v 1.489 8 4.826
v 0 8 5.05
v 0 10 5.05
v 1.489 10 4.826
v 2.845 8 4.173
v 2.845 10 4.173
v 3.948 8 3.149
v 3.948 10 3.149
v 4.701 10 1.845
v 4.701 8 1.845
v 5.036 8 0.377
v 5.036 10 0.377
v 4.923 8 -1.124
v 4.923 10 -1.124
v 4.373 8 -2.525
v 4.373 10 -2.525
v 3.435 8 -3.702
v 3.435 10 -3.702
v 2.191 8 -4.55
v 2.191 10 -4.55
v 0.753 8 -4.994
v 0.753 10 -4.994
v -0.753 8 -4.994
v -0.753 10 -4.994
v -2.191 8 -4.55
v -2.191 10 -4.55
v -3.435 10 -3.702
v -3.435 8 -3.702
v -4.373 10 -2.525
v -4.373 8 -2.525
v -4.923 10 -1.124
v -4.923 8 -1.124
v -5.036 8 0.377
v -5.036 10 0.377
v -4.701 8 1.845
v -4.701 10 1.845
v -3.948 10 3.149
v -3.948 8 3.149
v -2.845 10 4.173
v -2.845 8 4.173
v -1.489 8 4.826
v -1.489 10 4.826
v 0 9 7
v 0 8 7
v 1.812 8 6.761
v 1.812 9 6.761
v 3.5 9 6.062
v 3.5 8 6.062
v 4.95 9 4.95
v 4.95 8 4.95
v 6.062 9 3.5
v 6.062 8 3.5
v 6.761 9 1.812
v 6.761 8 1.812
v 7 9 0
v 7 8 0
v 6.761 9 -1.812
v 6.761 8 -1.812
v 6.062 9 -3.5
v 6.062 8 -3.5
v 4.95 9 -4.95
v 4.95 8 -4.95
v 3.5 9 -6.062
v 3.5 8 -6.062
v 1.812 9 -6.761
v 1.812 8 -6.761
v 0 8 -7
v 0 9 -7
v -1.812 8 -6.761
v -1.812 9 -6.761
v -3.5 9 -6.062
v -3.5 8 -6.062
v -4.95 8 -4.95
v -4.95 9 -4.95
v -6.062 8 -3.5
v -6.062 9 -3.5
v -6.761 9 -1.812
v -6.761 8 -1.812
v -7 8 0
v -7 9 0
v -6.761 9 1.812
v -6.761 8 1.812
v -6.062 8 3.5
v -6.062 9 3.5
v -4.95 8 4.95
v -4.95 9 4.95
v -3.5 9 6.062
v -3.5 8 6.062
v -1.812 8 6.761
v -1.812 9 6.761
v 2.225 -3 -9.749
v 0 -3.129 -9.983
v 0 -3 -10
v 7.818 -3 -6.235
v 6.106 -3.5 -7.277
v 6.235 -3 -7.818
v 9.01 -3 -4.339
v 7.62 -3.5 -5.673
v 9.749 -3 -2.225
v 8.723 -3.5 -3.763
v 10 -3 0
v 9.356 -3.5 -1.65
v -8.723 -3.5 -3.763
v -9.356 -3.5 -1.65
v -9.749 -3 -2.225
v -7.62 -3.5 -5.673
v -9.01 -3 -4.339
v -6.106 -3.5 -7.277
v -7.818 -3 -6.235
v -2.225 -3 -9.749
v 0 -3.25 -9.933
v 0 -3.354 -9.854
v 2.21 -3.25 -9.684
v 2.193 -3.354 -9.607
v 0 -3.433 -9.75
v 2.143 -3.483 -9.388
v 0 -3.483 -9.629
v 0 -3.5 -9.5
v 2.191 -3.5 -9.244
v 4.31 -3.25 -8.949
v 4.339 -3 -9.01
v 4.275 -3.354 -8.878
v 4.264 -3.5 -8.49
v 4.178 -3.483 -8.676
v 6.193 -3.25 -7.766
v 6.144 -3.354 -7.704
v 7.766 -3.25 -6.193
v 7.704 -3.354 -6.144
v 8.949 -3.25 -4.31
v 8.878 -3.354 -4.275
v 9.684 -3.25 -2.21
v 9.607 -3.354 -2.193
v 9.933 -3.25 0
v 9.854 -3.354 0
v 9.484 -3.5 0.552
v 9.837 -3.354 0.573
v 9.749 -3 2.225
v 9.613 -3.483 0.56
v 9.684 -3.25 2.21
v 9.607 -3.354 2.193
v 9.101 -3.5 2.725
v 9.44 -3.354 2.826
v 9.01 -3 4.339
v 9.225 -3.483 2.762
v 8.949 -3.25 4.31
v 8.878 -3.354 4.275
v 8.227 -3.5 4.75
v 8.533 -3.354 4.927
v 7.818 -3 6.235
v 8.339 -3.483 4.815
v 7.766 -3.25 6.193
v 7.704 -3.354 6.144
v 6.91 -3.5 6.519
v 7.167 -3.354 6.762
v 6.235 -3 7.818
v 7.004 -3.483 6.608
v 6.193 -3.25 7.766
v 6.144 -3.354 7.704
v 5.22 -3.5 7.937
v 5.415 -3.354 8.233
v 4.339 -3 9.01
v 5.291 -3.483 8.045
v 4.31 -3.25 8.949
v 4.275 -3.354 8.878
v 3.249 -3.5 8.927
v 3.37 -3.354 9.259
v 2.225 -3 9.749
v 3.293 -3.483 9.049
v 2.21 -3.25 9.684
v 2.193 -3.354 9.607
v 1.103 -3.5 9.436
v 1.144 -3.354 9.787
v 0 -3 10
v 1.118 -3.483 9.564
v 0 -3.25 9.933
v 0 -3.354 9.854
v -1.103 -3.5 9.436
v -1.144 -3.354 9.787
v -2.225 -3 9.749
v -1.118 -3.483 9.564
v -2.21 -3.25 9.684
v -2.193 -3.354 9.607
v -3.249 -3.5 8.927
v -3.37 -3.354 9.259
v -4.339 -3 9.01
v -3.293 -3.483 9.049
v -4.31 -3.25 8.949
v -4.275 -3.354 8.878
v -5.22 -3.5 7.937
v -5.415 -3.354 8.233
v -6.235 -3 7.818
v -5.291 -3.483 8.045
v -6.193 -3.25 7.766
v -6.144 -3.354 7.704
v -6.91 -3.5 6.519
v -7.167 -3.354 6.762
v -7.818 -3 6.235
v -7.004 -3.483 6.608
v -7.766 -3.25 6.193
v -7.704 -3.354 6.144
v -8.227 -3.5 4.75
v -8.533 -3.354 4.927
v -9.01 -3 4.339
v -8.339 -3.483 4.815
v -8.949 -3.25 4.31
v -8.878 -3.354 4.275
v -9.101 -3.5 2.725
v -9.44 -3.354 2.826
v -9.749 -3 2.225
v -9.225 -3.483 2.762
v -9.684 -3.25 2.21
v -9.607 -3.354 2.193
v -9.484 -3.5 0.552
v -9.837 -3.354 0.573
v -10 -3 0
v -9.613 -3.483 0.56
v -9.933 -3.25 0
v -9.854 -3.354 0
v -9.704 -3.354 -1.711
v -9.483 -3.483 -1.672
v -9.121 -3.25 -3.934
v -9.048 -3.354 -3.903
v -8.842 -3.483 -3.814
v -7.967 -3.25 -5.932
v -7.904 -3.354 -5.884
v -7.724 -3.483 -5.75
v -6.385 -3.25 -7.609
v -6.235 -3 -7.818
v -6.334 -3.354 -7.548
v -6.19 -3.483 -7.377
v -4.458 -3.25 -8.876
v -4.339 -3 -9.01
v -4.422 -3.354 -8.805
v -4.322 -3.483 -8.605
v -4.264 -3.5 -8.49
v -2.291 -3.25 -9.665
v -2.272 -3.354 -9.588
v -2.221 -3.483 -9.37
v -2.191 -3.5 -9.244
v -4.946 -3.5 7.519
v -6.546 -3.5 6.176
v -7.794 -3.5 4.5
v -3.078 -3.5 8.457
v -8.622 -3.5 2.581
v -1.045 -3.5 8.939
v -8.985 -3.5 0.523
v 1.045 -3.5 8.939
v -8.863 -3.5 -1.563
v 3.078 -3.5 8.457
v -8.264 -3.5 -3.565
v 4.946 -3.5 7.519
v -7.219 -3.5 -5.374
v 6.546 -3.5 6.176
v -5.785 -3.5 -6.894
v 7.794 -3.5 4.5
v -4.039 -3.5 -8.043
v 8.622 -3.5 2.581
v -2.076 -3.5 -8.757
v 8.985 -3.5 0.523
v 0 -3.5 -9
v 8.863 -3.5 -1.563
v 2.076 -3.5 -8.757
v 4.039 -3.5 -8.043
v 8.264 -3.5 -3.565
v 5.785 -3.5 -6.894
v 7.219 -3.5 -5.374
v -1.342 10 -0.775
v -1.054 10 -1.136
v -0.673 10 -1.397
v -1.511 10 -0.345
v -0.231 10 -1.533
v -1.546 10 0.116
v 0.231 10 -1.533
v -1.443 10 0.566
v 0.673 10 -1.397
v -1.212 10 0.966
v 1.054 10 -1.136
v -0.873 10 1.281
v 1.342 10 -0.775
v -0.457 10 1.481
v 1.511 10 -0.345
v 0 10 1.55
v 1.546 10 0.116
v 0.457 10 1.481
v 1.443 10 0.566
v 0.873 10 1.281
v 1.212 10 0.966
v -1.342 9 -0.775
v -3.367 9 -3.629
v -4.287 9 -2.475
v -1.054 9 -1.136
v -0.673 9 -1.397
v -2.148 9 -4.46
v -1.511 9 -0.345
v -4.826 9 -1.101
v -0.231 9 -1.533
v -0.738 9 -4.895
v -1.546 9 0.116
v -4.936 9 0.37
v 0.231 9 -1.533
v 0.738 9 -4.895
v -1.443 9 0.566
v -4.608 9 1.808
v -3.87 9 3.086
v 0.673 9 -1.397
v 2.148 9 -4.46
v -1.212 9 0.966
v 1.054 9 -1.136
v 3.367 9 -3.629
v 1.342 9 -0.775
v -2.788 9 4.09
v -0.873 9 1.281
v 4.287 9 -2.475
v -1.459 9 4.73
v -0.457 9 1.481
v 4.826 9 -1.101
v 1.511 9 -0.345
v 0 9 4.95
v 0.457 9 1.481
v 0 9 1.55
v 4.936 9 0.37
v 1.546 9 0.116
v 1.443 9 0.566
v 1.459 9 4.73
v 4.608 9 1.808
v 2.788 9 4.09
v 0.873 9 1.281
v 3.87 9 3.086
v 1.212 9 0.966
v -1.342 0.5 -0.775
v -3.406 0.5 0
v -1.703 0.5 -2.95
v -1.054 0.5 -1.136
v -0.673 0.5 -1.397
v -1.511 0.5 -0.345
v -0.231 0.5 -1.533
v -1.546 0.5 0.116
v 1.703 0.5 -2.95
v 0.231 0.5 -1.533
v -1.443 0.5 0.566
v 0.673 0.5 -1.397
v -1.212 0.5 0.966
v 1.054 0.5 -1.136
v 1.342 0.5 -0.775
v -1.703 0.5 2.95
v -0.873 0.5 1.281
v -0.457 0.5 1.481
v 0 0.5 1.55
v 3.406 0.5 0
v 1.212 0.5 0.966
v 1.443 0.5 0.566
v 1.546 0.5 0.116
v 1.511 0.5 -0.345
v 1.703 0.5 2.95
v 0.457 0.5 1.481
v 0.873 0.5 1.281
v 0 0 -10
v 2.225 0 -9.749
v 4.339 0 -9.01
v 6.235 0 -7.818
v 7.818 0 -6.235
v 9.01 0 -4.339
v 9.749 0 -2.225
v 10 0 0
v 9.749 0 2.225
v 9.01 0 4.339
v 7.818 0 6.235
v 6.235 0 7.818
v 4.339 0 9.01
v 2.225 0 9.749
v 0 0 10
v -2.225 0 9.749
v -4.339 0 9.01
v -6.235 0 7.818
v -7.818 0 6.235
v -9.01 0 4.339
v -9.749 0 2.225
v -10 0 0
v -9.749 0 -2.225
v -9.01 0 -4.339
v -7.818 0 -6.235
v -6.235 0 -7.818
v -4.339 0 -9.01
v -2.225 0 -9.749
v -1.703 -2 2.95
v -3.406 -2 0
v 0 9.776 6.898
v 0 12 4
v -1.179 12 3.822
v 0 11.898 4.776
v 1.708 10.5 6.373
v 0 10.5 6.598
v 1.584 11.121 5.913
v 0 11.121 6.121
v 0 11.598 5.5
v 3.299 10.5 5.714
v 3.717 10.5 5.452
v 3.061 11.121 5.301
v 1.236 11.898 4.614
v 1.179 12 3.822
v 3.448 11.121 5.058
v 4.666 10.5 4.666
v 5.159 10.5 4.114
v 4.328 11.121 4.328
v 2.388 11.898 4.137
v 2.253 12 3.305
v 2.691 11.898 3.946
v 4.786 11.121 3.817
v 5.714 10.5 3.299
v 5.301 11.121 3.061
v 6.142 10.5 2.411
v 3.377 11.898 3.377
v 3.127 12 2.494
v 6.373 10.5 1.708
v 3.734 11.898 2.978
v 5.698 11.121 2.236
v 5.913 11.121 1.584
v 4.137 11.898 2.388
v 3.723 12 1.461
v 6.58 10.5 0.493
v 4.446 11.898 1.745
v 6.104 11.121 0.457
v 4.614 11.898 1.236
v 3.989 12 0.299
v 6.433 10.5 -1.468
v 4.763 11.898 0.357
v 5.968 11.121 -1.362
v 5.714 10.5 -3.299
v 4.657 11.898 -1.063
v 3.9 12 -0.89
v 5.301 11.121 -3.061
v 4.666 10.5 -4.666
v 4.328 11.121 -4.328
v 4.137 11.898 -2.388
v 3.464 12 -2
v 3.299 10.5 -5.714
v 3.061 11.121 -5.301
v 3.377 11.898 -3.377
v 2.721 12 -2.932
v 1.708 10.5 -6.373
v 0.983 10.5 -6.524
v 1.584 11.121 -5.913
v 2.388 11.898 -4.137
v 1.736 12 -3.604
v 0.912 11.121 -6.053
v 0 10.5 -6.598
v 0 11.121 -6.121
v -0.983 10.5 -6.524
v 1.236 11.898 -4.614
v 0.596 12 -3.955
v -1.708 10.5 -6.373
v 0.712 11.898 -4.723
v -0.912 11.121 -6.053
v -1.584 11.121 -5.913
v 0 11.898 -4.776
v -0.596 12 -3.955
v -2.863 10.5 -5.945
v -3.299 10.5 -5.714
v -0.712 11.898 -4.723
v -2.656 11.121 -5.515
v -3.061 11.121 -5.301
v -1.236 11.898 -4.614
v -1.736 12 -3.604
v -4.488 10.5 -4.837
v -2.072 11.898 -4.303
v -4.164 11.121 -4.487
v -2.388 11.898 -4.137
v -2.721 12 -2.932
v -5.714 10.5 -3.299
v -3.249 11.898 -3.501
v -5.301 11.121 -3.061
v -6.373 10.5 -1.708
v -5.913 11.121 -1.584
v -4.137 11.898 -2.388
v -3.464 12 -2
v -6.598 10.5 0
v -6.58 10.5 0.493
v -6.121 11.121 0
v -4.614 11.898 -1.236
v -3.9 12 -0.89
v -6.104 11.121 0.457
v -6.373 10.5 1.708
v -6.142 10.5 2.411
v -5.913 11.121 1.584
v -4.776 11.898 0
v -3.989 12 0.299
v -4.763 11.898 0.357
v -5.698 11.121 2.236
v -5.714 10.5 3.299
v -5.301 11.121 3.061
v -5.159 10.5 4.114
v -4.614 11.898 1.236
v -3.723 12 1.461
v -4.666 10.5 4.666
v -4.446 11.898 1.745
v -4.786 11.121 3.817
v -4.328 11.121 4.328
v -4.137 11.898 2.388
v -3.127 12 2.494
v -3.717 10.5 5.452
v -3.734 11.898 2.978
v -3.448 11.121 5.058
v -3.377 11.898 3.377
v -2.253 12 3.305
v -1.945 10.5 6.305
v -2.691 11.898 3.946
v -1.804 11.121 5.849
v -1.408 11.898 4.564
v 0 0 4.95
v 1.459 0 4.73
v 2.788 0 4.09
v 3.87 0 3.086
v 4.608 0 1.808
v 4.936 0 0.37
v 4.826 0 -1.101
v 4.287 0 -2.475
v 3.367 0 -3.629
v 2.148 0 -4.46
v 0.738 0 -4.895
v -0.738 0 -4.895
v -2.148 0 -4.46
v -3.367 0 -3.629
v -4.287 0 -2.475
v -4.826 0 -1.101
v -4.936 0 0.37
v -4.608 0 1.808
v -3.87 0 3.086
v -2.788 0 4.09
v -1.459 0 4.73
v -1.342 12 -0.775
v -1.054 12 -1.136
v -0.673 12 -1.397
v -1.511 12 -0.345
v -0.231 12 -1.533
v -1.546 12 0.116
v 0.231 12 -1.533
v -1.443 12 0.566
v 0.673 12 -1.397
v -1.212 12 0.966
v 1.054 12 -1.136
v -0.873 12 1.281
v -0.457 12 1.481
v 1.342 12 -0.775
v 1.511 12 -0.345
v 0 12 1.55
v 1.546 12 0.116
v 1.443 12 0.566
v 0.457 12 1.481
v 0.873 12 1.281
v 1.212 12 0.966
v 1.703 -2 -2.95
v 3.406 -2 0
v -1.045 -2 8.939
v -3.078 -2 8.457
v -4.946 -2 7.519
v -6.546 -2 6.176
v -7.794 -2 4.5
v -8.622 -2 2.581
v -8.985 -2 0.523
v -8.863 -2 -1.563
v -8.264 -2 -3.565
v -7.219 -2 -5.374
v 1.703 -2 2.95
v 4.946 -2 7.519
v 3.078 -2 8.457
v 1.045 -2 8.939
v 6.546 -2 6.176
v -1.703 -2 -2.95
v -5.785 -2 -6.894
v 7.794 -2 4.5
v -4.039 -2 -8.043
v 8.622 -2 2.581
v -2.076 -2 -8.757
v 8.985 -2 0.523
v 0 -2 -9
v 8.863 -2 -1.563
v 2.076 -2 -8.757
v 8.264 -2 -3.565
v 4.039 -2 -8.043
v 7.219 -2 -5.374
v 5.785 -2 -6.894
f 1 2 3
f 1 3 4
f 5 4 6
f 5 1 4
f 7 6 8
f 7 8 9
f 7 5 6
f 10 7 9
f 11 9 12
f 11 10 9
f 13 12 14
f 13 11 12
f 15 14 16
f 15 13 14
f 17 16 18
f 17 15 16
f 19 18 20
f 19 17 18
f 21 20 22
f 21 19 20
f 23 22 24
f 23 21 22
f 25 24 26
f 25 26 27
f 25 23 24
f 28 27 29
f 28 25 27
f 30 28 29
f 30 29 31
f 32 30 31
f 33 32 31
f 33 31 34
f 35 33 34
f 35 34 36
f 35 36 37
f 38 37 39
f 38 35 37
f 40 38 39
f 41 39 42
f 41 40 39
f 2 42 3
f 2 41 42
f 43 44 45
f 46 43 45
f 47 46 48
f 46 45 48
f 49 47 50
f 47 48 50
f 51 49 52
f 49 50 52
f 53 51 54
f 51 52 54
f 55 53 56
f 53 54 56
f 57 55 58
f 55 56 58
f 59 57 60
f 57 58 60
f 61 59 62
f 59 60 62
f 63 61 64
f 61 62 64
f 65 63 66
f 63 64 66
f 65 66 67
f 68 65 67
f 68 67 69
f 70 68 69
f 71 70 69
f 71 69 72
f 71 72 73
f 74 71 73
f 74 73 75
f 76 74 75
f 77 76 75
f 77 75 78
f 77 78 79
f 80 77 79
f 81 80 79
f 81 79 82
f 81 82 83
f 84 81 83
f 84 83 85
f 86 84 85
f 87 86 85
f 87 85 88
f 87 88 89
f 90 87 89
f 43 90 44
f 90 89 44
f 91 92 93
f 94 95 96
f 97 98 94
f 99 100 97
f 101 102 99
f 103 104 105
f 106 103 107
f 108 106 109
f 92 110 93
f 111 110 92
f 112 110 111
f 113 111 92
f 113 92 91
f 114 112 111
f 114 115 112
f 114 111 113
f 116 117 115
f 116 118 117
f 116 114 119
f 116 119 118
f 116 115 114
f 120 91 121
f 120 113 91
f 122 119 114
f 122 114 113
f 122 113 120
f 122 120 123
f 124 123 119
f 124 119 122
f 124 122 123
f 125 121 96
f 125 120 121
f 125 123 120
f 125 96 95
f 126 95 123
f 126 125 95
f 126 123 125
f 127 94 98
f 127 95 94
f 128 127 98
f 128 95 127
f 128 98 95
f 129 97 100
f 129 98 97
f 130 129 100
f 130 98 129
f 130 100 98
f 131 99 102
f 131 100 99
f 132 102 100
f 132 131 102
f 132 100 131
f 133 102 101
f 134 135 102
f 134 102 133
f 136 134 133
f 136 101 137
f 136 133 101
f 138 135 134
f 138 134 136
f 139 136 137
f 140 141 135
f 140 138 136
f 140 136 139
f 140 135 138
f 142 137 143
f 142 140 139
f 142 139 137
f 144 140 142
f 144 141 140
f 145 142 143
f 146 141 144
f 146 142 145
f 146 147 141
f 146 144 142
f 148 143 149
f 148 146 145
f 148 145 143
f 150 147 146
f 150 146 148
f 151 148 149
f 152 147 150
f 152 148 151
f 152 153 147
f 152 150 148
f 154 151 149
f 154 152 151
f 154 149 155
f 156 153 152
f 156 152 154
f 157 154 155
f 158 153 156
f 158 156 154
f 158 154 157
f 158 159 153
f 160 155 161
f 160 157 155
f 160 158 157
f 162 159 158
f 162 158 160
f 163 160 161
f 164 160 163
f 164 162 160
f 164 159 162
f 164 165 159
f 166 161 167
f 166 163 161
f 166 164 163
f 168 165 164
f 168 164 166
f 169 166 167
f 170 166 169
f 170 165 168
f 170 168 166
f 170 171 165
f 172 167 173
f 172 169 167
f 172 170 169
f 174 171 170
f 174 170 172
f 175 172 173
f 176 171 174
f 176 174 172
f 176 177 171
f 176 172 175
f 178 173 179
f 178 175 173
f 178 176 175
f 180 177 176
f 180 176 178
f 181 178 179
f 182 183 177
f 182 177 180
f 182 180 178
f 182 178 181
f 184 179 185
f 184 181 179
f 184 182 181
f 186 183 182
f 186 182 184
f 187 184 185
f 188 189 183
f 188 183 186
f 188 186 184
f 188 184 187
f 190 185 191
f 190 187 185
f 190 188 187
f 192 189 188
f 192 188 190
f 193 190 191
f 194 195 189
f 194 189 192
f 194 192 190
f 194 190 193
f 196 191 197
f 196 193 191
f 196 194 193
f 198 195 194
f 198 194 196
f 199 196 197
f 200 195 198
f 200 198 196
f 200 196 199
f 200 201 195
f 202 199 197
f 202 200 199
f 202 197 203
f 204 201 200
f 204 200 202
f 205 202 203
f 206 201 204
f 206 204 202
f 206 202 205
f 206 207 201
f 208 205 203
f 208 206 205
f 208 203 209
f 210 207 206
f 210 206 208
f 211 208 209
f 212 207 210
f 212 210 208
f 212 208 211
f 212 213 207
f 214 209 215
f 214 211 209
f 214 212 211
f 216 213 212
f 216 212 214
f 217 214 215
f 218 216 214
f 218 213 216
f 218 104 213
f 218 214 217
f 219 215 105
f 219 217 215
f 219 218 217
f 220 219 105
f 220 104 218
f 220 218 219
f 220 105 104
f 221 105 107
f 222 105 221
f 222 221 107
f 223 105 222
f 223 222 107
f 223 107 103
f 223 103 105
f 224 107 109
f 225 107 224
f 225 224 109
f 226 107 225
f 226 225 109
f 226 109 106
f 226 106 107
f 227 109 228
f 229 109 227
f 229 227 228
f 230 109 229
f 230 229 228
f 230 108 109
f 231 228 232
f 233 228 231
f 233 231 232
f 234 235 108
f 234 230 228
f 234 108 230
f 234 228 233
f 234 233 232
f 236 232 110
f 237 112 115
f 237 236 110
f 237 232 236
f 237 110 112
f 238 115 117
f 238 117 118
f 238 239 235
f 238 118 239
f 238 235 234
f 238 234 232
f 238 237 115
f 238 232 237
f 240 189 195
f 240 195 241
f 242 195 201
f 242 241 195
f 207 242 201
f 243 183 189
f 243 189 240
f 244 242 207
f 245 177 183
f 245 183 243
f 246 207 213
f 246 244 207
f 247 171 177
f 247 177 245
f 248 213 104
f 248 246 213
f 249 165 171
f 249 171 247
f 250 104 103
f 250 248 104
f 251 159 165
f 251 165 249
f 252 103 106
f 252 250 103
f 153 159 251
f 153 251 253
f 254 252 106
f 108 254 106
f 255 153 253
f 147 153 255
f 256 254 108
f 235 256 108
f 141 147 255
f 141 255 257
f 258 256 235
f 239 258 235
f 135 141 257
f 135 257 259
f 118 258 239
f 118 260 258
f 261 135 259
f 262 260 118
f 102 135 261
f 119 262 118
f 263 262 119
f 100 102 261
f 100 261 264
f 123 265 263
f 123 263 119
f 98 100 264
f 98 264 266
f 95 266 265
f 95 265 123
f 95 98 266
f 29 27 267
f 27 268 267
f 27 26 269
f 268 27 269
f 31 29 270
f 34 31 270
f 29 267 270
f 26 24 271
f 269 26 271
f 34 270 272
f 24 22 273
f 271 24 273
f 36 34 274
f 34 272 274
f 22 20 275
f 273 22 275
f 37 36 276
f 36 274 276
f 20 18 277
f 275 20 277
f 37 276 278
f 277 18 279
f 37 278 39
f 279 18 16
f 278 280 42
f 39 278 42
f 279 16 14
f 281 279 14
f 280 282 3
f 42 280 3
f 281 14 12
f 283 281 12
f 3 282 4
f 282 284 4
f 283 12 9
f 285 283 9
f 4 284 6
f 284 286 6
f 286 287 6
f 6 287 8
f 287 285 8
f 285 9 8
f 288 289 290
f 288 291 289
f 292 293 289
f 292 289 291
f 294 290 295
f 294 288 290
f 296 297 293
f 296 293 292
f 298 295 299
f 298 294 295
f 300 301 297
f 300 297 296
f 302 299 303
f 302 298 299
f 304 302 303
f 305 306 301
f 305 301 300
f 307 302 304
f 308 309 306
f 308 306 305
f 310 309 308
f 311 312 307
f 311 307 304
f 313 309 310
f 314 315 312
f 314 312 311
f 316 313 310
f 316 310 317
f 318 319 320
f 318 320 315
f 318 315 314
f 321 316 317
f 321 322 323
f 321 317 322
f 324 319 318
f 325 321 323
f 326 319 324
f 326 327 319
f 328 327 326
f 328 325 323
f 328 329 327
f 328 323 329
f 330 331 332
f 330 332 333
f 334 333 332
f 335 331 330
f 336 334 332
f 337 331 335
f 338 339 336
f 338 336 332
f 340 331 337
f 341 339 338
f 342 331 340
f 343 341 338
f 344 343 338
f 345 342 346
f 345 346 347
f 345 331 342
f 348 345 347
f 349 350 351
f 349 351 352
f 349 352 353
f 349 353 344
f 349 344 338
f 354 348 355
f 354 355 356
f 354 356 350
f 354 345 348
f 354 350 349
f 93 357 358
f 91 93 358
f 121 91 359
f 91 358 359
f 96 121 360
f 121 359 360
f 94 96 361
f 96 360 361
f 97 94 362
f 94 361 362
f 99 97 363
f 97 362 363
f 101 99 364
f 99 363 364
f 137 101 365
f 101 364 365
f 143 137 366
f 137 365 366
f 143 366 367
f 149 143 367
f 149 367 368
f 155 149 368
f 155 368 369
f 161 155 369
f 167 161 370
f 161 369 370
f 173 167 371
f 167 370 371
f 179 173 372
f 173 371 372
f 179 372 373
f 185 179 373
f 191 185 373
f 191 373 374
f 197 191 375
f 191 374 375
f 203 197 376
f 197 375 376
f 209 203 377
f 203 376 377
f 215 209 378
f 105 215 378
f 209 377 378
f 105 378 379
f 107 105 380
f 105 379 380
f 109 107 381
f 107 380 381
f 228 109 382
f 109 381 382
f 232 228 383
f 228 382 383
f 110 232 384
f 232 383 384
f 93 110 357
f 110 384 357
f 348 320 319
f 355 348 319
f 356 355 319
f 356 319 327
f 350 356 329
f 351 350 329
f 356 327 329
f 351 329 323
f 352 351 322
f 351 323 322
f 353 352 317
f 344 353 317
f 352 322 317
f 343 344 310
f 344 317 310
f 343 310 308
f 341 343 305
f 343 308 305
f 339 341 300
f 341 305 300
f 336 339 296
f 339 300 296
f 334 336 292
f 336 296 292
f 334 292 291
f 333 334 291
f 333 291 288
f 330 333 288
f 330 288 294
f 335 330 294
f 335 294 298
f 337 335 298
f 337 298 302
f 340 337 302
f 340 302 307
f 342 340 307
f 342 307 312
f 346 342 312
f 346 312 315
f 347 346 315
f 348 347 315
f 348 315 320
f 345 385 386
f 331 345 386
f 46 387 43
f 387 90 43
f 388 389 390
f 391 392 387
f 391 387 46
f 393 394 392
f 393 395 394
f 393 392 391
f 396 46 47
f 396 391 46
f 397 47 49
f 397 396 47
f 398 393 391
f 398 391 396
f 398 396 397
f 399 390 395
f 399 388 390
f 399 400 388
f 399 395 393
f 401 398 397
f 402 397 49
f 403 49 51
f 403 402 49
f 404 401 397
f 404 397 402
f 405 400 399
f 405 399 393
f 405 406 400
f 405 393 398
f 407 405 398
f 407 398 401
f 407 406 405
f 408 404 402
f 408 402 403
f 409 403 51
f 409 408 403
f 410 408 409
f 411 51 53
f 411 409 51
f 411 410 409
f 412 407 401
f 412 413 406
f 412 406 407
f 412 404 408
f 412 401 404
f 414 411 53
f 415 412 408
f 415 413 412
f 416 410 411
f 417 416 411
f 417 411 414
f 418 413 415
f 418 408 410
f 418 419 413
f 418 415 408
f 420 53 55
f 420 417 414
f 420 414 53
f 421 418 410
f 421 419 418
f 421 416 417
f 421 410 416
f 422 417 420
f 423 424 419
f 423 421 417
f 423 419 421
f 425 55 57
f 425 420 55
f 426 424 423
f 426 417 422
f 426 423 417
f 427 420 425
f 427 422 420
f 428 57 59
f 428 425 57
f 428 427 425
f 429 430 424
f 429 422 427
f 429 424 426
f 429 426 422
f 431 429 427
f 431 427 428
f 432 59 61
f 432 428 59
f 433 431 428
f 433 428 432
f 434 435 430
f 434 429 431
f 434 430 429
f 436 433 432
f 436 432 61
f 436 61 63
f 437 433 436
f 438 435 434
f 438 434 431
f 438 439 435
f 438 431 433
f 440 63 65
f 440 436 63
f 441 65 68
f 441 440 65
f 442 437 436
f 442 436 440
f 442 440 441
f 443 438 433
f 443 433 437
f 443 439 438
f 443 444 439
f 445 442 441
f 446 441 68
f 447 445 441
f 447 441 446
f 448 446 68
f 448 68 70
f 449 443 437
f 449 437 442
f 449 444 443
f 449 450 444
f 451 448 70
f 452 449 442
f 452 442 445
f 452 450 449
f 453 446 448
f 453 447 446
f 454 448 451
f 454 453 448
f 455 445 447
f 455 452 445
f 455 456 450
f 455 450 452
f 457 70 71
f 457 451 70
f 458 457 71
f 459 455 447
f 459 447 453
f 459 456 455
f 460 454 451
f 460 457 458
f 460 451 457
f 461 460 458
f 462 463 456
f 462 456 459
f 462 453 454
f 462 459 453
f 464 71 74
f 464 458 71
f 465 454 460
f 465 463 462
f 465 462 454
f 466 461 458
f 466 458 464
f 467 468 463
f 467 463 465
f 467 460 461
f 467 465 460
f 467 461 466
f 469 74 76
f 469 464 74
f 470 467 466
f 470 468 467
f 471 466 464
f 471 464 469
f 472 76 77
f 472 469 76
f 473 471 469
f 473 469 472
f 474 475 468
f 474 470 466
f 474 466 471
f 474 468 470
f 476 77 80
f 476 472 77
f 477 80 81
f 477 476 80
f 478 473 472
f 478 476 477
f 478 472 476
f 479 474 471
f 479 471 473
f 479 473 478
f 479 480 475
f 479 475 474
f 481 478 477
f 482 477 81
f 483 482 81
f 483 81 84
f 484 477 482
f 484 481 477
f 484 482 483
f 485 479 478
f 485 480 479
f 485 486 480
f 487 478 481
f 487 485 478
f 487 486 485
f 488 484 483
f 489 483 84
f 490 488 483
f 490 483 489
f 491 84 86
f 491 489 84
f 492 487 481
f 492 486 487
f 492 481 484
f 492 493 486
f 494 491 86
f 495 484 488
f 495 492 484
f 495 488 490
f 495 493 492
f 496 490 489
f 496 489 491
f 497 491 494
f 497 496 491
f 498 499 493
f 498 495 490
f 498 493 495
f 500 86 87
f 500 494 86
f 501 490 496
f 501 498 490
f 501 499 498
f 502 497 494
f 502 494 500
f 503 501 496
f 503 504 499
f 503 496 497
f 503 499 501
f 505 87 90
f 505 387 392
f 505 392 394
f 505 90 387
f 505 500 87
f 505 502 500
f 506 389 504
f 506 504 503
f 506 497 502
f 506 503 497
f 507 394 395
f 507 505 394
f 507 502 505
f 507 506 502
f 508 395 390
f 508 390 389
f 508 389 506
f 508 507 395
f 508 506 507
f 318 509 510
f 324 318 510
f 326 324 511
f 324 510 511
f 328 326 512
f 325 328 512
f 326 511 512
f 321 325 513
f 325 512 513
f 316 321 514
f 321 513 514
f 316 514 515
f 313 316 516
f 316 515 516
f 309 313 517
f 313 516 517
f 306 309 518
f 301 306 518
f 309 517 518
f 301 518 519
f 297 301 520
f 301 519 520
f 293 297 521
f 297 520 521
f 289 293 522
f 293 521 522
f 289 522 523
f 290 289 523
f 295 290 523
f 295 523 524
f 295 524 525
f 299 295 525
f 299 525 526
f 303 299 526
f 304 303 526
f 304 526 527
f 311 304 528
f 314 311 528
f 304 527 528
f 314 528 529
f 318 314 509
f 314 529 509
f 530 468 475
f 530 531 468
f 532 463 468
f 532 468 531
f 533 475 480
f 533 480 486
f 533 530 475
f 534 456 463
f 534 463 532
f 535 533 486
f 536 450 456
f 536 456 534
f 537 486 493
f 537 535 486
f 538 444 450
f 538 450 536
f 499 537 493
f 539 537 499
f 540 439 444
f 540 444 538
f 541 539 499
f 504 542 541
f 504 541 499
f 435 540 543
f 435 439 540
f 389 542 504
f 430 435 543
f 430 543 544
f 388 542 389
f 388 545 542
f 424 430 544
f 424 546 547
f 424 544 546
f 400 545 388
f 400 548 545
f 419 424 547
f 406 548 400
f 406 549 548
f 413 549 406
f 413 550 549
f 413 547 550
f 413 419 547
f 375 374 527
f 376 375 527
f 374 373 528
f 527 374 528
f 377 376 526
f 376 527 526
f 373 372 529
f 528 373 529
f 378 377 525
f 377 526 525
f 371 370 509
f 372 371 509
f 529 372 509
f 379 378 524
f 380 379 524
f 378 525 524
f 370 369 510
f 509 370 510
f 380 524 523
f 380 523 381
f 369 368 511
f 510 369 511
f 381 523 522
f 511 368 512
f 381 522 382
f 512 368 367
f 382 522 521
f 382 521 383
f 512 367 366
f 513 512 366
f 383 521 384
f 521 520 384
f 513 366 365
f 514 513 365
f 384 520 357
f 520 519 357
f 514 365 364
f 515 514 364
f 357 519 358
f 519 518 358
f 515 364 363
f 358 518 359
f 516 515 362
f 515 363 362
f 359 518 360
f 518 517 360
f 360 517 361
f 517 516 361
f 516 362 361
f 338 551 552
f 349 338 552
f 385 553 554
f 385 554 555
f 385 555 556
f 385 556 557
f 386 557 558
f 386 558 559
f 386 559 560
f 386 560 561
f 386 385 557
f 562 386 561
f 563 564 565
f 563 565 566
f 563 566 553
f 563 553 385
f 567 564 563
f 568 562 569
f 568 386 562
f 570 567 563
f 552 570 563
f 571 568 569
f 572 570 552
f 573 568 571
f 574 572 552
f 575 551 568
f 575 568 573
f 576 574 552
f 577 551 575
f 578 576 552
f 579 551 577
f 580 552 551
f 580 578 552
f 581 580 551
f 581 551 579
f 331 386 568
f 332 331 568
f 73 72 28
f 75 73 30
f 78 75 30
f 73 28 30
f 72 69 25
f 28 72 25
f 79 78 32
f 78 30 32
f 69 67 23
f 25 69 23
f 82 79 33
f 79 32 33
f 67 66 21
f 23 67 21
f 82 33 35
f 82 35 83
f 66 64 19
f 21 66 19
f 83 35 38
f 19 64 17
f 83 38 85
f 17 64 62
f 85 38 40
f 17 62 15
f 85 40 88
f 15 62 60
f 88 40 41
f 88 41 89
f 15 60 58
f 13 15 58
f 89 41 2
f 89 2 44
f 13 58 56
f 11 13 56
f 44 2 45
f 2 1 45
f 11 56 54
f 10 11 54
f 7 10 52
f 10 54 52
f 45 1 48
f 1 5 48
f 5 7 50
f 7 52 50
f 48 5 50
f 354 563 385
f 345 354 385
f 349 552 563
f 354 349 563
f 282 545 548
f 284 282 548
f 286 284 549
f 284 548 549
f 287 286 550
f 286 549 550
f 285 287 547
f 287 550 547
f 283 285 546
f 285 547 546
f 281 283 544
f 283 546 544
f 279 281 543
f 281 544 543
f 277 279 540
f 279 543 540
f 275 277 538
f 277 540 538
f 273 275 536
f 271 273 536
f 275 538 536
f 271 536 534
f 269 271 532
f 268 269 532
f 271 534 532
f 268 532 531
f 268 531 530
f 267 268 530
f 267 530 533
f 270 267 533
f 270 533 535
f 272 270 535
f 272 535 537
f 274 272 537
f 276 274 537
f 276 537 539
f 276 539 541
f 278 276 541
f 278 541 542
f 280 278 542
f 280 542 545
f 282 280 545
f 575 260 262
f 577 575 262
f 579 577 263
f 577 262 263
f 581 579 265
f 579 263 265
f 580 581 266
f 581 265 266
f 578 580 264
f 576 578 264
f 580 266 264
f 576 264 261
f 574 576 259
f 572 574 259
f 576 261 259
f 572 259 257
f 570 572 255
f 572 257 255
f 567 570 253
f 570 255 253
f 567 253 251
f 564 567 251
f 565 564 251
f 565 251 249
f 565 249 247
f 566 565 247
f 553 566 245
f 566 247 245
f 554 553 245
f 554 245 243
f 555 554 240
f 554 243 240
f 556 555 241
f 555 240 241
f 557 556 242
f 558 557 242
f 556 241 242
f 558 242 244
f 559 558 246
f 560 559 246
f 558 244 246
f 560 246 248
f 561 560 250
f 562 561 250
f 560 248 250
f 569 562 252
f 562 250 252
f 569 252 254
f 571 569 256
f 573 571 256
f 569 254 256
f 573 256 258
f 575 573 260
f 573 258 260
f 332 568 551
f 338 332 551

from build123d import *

# Parameters (mm, degrees)
SKETCH1_R           = 4.95
BOSS_EXTRUDE1_DEPTH = 9
SKETCH2_R           = 10
BOSS_EXTRUDE2_DEPTH = 3.5
SKETCH3_R           = 9
CUT_EXTRUDE1_DEPTH  = 1.5
SKETCH4_R           = 1.55
CUT_EXTRUDE2_DEPTH  = 19.874586088
CUT_EXTRUDE3_DEPTH  = 2.5
FILLET1_R           = 0.5
SKETCH6_R           = 7
SKETCH6_R_2         = 5.05
BOSS_EXTRUDE3_DEPTH = 2
SKETCH7_R           = 7
BOSS_EXTRUDE4_DEPTH = 2
SKETCH8_R           = 1.55
CUT_EXTRUDE4_DEPTH  = 21.98213538
FILLET2_R           = 3


with BuildPart() as part:
    # Sketch1 → Boss-Extrude1 (new body)
    with BuildSketch(Plane(origin=(0, 0, 0), x_dir=(1, 0, 0), z_dir=(0, 1, 0))):
        with Locations(Location((0, 0, 0), (0, 0, 270))):
            Circle(SKETCH1_R)
    extrude(amount=BOSS_EXTRUDE1_DEPTH)

    # Sketch2 → Boss-Extrude2 (add)
    with BuildSketch(Plane.XZ):
        with Locations(Location((0, 0, 0), (0, 0, 270))):
            Circle(SKETCH2_R)
    extrude(amount=BOSS_EXTRUDE2_DEPTH)

    # Sketch3 → Cut-Extrude1 (cut)
    with BuildSketch(Plane.XZ.offset(3.5)):
        with Locations(Location((0, 0, 0), (0, 0, 270))):
            Circle(SKETCH3_R)
    extrude(amount=-CUT_EXTRUDE1_DEPTH, mode=Mode.SUBTRACT)

    # Sketch4 → Cut-Extrude2 (cut, through all)
    with BuildSketch(Plane(origin=(0, 9, 0), x_dir=(1, 0, 0), z_dir=(0, 1, 0))):
        with Locations(Location((0, 0, 0), (0, 0, 270))):
            Circle(SKETCH4_R)
    extrude(amount=-CUT_EXTRUDE2_DEPTH, mode=Mode.SUBTRACT)

    # Sketch5 → Cut-Extrude3 (cut)
    with BuildSketch(Plane.XZ.offset(2)):
        Polygon((1.703183294, 2.95), (-1.703183294, 2.95), (-3.406366588, 0), (-1.703183294, -2.95), (1.703183294, -2.95), (3.406366588, 0), align=None)
    extrude(amount=-CUT_EXTRUDE3_DEPTH, mode=Mode.SUBTRACT)

    # Fillet1
    fillet1_edges = [part.edges().sort_by_distance(p)[0] for p in [
        (0, -3.5, 10),
    ]]
    fillet(fillet1_edges, radius=FILLET1_R)


with BuildPart() as body_2:
    # Sketch6 → Boss-Extrude3 (new body)
    with BuildSketch(Plane(origin=(0, 8, 0), x_dir=(1, 0, 0), z_dir=(0, 1, 0))):
        with Locations(Location((0, 0, 0), (0, 0, 270))):
            Circle(SKETCH6_R)
        with Locations(Location((0, 0, 0), (0, 0, 270))):
            Circle(SKETCH6_R_2, mode=Mode.SUBTRACT)
    extrude(amount=BOSS_EXTRUDE3_DEPTH)

    # Sketch7 → Boss-Extrude4 (add)
    with BuildSketch(Plane(origin=(0, 10, 0), x_dir=(1, 0, 0), z_dir=(0, 1, 0))):
        with Locations(Location((0, 0, 0), (0, 0, 270))):
            Circle(SKETCH7_R)
    extrude(amount=BOSS_EXTRUDE4_DEPTH)

    # Sketch8 → Cut-Extrude4 (cut, through all)
    with BuildSketch(Plane(origin=(0, 12, 0), x_dir=(1, 0, 0), z_dir=(0, 1, 0))):
        with Locations(Location((0, 0, 0), (0, 0, 270))):
            Circle(SKETCH8_R)
    extrude(amount=-CUT_EXTRUDE4_DEPTH, mode=Mode.SUBTRACT)

    # Fillet2
    fillet2_edges = [body_2.edges().sort_by_distance(p)[0] for p in [
        (0, 12, -7),
    ]]
    fillet(fillet2_edges, radius=FILLET2_R)


solid = Compound([part.part, body_2.part])
